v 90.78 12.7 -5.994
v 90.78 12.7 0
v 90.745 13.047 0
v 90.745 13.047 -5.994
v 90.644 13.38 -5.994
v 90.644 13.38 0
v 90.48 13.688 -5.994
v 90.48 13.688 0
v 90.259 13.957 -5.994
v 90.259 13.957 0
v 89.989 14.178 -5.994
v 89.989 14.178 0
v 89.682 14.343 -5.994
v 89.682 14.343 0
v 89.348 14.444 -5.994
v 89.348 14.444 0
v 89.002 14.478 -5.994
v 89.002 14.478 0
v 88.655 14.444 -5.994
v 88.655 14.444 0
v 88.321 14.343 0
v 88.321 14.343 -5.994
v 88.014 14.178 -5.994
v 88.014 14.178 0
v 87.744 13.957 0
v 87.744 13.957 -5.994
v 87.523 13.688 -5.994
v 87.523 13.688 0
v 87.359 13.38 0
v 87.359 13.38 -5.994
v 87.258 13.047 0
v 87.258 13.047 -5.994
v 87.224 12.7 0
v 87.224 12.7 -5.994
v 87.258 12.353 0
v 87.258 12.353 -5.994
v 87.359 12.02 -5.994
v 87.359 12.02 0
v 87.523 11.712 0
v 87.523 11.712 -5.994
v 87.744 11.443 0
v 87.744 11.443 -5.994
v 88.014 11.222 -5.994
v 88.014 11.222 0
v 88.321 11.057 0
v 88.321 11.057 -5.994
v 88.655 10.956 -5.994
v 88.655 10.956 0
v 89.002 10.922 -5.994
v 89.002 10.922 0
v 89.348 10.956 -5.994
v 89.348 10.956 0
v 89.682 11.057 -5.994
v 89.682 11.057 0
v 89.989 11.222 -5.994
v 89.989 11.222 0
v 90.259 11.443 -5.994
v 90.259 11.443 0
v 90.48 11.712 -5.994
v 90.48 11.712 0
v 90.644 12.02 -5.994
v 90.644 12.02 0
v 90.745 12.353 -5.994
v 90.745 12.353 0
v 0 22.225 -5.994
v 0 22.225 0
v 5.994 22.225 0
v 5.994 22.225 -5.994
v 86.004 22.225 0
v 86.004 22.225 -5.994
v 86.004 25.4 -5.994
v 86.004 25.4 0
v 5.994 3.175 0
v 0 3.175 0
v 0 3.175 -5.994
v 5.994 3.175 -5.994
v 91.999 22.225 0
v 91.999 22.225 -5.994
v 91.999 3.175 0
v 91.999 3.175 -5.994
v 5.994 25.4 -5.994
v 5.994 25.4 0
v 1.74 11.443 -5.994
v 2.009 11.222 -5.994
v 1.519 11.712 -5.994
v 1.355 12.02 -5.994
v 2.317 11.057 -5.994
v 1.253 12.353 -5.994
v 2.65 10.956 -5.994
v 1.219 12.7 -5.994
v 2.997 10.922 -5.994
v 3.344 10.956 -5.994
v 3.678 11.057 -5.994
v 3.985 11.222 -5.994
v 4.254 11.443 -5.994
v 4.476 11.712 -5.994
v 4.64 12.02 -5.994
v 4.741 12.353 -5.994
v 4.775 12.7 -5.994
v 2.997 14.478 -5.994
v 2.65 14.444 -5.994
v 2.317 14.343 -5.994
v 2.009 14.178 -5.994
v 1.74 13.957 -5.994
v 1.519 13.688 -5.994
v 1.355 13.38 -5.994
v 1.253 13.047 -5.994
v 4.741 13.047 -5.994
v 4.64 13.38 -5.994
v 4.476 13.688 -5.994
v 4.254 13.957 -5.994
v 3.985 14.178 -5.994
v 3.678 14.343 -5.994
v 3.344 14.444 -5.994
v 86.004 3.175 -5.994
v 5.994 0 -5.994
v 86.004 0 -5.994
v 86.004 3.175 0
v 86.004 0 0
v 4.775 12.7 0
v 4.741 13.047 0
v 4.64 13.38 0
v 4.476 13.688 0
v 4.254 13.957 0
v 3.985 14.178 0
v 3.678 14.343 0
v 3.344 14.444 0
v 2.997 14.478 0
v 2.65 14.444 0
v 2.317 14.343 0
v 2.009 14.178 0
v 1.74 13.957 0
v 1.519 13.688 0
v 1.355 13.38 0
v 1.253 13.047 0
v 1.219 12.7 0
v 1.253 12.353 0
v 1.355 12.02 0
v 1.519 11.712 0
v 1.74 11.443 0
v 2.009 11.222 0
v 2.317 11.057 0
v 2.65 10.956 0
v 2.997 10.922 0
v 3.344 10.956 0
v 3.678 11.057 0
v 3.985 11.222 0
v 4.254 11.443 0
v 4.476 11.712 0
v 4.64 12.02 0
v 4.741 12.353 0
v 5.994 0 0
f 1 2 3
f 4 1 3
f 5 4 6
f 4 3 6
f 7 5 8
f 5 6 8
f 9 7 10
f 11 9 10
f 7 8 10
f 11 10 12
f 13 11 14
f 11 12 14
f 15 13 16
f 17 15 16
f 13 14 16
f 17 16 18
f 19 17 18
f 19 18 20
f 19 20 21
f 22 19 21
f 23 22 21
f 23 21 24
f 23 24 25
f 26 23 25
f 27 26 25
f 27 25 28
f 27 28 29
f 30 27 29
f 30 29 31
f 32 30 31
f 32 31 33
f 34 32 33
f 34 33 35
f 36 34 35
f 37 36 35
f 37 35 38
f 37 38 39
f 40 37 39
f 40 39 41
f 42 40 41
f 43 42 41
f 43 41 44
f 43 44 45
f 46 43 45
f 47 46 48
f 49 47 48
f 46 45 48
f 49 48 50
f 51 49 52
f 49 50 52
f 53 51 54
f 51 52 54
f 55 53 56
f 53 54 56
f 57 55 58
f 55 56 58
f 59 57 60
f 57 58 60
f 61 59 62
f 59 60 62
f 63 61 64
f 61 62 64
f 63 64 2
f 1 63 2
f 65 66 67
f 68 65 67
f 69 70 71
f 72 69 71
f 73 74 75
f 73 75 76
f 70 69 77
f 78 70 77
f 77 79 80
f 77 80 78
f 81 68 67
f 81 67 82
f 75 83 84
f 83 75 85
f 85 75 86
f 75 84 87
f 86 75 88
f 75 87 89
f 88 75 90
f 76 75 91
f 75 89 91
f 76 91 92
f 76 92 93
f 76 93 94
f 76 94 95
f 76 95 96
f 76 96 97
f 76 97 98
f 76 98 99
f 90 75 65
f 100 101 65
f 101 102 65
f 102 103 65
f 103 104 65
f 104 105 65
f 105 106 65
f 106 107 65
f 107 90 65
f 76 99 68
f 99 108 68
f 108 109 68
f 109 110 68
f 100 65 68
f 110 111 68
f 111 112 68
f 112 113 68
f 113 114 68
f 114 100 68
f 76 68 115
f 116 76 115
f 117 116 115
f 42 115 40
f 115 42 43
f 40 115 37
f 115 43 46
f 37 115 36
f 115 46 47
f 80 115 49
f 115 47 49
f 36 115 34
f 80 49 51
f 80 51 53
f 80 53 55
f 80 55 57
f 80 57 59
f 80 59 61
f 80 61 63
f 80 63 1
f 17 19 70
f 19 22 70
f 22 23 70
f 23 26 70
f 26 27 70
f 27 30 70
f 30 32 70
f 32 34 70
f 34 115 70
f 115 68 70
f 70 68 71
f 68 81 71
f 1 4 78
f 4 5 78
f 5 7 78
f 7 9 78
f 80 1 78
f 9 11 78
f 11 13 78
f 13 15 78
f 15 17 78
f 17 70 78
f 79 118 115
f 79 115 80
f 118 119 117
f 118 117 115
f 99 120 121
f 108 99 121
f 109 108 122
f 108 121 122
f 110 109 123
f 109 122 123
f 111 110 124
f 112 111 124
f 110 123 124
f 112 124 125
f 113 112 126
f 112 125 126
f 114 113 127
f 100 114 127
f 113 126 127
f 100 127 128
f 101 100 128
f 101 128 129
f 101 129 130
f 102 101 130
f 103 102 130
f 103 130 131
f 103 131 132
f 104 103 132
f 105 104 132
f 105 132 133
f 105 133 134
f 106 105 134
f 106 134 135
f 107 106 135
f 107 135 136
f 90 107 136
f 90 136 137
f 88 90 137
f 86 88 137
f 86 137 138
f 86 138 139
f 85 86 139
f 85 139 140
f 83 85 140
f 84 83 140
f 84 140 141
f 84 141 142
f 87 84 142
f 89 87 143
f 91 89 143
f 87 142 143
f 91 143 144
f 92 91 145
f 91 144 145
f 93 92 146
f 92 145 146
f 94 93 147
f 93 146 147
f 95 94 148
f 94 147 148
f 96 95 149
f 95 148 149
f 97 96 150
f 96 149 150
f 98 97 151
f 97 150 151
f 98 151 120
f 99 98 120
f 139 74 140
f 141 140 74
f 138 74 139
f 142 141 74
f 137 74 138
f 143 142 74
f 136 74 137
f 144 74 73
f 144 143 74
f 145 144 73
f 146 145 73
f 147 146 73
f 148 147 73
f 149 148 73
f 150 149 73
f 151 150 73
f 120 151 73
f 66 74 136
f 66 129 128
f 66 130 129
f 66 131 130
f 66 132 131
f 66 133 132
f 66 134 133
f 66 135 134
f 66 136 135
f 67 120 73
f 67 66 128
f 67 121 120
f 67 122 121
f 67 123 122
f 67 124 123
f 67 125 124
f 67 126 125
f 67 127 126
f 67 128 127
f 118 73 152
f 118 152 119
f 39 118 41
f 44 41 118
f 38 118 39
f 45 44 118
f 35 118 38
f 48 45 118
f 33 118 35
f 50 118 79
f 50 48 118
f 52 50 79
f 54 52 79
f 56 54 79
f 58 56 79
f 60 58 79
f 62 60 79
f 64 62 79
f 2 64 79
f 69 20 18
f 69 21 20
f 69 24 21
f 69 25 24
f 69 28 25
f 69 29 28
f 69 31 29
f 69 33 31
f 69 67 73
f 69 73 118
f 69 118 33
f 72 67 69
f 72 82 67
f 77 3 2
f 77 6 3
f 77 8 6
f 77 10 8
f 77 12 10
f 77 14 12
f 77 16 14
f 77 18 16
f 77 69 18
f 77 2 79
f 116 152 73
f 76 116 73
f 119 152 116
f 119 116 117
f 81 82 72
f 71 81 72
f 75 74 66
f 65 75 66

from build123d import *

# Parameters (mm, degrees)
SKETCH1_W           = 91.9988
SKETCH1_H           = 25.4
BOSS_EXTRUDE1_DEPTH = 5.9944
SKETCH2_R           = 1.778
CUT_EXTRUDE1_DEPTH  = 6.9944
SKETCH3_W           = 5.9944
SKETCH3_H           = 3.175
CUT_EXTRUDE2_DEPTH  = 6.9944


with BuildPart() as part:
    # Sketch1 → Boss-Extrude1 (new body)
    with BuildSketch(Plane.XY):
        with Locations((45.9994, 12.7)):
            Rectangle(SKETCH1_W, SKETCH1_H)
    extrude(amount=-BOSS_EXTRUDE1_DEPTH)

    # Sketch2 → Cut-Extrude1 (cut, through all)
    with BuildSketch(Plane.XY):
        with Locations((2.9972, 12.7)):
            Circle(SKETCH2_R)
        with Locations((89.0016, 12.7)):
            Circle(SKETCH2_R)
    extrude(amount=-CUT_EXTRUDE1_DEPTH, mode=Mode.SUBTRACT)

    # Sketch3 → Cut-Extrude2 (cut, through all)
    with BuildSketch(Plane.XY):
        with Locations((2.9972, 23.8125)):
            Rectangle(SKETCH3_W, SKETCH3_H)
        with Locations((89.0016, 23.8125)):
            Rectangle(SKETCH3_W, SKETCH3_H)
        with Locations((89.0016, 1.5875)):
            Rectangle(SKETCH3_W, SKETCH3_H)
        with Locations((2.9972, 1.5875)):
            Rectangle(SKETCH3_W, SKETCH3_H)
    extrude(amount=-CUT_EXTRUDE2_DEPTH, mode=Mode.SUBTRACT)


solid = part.part
